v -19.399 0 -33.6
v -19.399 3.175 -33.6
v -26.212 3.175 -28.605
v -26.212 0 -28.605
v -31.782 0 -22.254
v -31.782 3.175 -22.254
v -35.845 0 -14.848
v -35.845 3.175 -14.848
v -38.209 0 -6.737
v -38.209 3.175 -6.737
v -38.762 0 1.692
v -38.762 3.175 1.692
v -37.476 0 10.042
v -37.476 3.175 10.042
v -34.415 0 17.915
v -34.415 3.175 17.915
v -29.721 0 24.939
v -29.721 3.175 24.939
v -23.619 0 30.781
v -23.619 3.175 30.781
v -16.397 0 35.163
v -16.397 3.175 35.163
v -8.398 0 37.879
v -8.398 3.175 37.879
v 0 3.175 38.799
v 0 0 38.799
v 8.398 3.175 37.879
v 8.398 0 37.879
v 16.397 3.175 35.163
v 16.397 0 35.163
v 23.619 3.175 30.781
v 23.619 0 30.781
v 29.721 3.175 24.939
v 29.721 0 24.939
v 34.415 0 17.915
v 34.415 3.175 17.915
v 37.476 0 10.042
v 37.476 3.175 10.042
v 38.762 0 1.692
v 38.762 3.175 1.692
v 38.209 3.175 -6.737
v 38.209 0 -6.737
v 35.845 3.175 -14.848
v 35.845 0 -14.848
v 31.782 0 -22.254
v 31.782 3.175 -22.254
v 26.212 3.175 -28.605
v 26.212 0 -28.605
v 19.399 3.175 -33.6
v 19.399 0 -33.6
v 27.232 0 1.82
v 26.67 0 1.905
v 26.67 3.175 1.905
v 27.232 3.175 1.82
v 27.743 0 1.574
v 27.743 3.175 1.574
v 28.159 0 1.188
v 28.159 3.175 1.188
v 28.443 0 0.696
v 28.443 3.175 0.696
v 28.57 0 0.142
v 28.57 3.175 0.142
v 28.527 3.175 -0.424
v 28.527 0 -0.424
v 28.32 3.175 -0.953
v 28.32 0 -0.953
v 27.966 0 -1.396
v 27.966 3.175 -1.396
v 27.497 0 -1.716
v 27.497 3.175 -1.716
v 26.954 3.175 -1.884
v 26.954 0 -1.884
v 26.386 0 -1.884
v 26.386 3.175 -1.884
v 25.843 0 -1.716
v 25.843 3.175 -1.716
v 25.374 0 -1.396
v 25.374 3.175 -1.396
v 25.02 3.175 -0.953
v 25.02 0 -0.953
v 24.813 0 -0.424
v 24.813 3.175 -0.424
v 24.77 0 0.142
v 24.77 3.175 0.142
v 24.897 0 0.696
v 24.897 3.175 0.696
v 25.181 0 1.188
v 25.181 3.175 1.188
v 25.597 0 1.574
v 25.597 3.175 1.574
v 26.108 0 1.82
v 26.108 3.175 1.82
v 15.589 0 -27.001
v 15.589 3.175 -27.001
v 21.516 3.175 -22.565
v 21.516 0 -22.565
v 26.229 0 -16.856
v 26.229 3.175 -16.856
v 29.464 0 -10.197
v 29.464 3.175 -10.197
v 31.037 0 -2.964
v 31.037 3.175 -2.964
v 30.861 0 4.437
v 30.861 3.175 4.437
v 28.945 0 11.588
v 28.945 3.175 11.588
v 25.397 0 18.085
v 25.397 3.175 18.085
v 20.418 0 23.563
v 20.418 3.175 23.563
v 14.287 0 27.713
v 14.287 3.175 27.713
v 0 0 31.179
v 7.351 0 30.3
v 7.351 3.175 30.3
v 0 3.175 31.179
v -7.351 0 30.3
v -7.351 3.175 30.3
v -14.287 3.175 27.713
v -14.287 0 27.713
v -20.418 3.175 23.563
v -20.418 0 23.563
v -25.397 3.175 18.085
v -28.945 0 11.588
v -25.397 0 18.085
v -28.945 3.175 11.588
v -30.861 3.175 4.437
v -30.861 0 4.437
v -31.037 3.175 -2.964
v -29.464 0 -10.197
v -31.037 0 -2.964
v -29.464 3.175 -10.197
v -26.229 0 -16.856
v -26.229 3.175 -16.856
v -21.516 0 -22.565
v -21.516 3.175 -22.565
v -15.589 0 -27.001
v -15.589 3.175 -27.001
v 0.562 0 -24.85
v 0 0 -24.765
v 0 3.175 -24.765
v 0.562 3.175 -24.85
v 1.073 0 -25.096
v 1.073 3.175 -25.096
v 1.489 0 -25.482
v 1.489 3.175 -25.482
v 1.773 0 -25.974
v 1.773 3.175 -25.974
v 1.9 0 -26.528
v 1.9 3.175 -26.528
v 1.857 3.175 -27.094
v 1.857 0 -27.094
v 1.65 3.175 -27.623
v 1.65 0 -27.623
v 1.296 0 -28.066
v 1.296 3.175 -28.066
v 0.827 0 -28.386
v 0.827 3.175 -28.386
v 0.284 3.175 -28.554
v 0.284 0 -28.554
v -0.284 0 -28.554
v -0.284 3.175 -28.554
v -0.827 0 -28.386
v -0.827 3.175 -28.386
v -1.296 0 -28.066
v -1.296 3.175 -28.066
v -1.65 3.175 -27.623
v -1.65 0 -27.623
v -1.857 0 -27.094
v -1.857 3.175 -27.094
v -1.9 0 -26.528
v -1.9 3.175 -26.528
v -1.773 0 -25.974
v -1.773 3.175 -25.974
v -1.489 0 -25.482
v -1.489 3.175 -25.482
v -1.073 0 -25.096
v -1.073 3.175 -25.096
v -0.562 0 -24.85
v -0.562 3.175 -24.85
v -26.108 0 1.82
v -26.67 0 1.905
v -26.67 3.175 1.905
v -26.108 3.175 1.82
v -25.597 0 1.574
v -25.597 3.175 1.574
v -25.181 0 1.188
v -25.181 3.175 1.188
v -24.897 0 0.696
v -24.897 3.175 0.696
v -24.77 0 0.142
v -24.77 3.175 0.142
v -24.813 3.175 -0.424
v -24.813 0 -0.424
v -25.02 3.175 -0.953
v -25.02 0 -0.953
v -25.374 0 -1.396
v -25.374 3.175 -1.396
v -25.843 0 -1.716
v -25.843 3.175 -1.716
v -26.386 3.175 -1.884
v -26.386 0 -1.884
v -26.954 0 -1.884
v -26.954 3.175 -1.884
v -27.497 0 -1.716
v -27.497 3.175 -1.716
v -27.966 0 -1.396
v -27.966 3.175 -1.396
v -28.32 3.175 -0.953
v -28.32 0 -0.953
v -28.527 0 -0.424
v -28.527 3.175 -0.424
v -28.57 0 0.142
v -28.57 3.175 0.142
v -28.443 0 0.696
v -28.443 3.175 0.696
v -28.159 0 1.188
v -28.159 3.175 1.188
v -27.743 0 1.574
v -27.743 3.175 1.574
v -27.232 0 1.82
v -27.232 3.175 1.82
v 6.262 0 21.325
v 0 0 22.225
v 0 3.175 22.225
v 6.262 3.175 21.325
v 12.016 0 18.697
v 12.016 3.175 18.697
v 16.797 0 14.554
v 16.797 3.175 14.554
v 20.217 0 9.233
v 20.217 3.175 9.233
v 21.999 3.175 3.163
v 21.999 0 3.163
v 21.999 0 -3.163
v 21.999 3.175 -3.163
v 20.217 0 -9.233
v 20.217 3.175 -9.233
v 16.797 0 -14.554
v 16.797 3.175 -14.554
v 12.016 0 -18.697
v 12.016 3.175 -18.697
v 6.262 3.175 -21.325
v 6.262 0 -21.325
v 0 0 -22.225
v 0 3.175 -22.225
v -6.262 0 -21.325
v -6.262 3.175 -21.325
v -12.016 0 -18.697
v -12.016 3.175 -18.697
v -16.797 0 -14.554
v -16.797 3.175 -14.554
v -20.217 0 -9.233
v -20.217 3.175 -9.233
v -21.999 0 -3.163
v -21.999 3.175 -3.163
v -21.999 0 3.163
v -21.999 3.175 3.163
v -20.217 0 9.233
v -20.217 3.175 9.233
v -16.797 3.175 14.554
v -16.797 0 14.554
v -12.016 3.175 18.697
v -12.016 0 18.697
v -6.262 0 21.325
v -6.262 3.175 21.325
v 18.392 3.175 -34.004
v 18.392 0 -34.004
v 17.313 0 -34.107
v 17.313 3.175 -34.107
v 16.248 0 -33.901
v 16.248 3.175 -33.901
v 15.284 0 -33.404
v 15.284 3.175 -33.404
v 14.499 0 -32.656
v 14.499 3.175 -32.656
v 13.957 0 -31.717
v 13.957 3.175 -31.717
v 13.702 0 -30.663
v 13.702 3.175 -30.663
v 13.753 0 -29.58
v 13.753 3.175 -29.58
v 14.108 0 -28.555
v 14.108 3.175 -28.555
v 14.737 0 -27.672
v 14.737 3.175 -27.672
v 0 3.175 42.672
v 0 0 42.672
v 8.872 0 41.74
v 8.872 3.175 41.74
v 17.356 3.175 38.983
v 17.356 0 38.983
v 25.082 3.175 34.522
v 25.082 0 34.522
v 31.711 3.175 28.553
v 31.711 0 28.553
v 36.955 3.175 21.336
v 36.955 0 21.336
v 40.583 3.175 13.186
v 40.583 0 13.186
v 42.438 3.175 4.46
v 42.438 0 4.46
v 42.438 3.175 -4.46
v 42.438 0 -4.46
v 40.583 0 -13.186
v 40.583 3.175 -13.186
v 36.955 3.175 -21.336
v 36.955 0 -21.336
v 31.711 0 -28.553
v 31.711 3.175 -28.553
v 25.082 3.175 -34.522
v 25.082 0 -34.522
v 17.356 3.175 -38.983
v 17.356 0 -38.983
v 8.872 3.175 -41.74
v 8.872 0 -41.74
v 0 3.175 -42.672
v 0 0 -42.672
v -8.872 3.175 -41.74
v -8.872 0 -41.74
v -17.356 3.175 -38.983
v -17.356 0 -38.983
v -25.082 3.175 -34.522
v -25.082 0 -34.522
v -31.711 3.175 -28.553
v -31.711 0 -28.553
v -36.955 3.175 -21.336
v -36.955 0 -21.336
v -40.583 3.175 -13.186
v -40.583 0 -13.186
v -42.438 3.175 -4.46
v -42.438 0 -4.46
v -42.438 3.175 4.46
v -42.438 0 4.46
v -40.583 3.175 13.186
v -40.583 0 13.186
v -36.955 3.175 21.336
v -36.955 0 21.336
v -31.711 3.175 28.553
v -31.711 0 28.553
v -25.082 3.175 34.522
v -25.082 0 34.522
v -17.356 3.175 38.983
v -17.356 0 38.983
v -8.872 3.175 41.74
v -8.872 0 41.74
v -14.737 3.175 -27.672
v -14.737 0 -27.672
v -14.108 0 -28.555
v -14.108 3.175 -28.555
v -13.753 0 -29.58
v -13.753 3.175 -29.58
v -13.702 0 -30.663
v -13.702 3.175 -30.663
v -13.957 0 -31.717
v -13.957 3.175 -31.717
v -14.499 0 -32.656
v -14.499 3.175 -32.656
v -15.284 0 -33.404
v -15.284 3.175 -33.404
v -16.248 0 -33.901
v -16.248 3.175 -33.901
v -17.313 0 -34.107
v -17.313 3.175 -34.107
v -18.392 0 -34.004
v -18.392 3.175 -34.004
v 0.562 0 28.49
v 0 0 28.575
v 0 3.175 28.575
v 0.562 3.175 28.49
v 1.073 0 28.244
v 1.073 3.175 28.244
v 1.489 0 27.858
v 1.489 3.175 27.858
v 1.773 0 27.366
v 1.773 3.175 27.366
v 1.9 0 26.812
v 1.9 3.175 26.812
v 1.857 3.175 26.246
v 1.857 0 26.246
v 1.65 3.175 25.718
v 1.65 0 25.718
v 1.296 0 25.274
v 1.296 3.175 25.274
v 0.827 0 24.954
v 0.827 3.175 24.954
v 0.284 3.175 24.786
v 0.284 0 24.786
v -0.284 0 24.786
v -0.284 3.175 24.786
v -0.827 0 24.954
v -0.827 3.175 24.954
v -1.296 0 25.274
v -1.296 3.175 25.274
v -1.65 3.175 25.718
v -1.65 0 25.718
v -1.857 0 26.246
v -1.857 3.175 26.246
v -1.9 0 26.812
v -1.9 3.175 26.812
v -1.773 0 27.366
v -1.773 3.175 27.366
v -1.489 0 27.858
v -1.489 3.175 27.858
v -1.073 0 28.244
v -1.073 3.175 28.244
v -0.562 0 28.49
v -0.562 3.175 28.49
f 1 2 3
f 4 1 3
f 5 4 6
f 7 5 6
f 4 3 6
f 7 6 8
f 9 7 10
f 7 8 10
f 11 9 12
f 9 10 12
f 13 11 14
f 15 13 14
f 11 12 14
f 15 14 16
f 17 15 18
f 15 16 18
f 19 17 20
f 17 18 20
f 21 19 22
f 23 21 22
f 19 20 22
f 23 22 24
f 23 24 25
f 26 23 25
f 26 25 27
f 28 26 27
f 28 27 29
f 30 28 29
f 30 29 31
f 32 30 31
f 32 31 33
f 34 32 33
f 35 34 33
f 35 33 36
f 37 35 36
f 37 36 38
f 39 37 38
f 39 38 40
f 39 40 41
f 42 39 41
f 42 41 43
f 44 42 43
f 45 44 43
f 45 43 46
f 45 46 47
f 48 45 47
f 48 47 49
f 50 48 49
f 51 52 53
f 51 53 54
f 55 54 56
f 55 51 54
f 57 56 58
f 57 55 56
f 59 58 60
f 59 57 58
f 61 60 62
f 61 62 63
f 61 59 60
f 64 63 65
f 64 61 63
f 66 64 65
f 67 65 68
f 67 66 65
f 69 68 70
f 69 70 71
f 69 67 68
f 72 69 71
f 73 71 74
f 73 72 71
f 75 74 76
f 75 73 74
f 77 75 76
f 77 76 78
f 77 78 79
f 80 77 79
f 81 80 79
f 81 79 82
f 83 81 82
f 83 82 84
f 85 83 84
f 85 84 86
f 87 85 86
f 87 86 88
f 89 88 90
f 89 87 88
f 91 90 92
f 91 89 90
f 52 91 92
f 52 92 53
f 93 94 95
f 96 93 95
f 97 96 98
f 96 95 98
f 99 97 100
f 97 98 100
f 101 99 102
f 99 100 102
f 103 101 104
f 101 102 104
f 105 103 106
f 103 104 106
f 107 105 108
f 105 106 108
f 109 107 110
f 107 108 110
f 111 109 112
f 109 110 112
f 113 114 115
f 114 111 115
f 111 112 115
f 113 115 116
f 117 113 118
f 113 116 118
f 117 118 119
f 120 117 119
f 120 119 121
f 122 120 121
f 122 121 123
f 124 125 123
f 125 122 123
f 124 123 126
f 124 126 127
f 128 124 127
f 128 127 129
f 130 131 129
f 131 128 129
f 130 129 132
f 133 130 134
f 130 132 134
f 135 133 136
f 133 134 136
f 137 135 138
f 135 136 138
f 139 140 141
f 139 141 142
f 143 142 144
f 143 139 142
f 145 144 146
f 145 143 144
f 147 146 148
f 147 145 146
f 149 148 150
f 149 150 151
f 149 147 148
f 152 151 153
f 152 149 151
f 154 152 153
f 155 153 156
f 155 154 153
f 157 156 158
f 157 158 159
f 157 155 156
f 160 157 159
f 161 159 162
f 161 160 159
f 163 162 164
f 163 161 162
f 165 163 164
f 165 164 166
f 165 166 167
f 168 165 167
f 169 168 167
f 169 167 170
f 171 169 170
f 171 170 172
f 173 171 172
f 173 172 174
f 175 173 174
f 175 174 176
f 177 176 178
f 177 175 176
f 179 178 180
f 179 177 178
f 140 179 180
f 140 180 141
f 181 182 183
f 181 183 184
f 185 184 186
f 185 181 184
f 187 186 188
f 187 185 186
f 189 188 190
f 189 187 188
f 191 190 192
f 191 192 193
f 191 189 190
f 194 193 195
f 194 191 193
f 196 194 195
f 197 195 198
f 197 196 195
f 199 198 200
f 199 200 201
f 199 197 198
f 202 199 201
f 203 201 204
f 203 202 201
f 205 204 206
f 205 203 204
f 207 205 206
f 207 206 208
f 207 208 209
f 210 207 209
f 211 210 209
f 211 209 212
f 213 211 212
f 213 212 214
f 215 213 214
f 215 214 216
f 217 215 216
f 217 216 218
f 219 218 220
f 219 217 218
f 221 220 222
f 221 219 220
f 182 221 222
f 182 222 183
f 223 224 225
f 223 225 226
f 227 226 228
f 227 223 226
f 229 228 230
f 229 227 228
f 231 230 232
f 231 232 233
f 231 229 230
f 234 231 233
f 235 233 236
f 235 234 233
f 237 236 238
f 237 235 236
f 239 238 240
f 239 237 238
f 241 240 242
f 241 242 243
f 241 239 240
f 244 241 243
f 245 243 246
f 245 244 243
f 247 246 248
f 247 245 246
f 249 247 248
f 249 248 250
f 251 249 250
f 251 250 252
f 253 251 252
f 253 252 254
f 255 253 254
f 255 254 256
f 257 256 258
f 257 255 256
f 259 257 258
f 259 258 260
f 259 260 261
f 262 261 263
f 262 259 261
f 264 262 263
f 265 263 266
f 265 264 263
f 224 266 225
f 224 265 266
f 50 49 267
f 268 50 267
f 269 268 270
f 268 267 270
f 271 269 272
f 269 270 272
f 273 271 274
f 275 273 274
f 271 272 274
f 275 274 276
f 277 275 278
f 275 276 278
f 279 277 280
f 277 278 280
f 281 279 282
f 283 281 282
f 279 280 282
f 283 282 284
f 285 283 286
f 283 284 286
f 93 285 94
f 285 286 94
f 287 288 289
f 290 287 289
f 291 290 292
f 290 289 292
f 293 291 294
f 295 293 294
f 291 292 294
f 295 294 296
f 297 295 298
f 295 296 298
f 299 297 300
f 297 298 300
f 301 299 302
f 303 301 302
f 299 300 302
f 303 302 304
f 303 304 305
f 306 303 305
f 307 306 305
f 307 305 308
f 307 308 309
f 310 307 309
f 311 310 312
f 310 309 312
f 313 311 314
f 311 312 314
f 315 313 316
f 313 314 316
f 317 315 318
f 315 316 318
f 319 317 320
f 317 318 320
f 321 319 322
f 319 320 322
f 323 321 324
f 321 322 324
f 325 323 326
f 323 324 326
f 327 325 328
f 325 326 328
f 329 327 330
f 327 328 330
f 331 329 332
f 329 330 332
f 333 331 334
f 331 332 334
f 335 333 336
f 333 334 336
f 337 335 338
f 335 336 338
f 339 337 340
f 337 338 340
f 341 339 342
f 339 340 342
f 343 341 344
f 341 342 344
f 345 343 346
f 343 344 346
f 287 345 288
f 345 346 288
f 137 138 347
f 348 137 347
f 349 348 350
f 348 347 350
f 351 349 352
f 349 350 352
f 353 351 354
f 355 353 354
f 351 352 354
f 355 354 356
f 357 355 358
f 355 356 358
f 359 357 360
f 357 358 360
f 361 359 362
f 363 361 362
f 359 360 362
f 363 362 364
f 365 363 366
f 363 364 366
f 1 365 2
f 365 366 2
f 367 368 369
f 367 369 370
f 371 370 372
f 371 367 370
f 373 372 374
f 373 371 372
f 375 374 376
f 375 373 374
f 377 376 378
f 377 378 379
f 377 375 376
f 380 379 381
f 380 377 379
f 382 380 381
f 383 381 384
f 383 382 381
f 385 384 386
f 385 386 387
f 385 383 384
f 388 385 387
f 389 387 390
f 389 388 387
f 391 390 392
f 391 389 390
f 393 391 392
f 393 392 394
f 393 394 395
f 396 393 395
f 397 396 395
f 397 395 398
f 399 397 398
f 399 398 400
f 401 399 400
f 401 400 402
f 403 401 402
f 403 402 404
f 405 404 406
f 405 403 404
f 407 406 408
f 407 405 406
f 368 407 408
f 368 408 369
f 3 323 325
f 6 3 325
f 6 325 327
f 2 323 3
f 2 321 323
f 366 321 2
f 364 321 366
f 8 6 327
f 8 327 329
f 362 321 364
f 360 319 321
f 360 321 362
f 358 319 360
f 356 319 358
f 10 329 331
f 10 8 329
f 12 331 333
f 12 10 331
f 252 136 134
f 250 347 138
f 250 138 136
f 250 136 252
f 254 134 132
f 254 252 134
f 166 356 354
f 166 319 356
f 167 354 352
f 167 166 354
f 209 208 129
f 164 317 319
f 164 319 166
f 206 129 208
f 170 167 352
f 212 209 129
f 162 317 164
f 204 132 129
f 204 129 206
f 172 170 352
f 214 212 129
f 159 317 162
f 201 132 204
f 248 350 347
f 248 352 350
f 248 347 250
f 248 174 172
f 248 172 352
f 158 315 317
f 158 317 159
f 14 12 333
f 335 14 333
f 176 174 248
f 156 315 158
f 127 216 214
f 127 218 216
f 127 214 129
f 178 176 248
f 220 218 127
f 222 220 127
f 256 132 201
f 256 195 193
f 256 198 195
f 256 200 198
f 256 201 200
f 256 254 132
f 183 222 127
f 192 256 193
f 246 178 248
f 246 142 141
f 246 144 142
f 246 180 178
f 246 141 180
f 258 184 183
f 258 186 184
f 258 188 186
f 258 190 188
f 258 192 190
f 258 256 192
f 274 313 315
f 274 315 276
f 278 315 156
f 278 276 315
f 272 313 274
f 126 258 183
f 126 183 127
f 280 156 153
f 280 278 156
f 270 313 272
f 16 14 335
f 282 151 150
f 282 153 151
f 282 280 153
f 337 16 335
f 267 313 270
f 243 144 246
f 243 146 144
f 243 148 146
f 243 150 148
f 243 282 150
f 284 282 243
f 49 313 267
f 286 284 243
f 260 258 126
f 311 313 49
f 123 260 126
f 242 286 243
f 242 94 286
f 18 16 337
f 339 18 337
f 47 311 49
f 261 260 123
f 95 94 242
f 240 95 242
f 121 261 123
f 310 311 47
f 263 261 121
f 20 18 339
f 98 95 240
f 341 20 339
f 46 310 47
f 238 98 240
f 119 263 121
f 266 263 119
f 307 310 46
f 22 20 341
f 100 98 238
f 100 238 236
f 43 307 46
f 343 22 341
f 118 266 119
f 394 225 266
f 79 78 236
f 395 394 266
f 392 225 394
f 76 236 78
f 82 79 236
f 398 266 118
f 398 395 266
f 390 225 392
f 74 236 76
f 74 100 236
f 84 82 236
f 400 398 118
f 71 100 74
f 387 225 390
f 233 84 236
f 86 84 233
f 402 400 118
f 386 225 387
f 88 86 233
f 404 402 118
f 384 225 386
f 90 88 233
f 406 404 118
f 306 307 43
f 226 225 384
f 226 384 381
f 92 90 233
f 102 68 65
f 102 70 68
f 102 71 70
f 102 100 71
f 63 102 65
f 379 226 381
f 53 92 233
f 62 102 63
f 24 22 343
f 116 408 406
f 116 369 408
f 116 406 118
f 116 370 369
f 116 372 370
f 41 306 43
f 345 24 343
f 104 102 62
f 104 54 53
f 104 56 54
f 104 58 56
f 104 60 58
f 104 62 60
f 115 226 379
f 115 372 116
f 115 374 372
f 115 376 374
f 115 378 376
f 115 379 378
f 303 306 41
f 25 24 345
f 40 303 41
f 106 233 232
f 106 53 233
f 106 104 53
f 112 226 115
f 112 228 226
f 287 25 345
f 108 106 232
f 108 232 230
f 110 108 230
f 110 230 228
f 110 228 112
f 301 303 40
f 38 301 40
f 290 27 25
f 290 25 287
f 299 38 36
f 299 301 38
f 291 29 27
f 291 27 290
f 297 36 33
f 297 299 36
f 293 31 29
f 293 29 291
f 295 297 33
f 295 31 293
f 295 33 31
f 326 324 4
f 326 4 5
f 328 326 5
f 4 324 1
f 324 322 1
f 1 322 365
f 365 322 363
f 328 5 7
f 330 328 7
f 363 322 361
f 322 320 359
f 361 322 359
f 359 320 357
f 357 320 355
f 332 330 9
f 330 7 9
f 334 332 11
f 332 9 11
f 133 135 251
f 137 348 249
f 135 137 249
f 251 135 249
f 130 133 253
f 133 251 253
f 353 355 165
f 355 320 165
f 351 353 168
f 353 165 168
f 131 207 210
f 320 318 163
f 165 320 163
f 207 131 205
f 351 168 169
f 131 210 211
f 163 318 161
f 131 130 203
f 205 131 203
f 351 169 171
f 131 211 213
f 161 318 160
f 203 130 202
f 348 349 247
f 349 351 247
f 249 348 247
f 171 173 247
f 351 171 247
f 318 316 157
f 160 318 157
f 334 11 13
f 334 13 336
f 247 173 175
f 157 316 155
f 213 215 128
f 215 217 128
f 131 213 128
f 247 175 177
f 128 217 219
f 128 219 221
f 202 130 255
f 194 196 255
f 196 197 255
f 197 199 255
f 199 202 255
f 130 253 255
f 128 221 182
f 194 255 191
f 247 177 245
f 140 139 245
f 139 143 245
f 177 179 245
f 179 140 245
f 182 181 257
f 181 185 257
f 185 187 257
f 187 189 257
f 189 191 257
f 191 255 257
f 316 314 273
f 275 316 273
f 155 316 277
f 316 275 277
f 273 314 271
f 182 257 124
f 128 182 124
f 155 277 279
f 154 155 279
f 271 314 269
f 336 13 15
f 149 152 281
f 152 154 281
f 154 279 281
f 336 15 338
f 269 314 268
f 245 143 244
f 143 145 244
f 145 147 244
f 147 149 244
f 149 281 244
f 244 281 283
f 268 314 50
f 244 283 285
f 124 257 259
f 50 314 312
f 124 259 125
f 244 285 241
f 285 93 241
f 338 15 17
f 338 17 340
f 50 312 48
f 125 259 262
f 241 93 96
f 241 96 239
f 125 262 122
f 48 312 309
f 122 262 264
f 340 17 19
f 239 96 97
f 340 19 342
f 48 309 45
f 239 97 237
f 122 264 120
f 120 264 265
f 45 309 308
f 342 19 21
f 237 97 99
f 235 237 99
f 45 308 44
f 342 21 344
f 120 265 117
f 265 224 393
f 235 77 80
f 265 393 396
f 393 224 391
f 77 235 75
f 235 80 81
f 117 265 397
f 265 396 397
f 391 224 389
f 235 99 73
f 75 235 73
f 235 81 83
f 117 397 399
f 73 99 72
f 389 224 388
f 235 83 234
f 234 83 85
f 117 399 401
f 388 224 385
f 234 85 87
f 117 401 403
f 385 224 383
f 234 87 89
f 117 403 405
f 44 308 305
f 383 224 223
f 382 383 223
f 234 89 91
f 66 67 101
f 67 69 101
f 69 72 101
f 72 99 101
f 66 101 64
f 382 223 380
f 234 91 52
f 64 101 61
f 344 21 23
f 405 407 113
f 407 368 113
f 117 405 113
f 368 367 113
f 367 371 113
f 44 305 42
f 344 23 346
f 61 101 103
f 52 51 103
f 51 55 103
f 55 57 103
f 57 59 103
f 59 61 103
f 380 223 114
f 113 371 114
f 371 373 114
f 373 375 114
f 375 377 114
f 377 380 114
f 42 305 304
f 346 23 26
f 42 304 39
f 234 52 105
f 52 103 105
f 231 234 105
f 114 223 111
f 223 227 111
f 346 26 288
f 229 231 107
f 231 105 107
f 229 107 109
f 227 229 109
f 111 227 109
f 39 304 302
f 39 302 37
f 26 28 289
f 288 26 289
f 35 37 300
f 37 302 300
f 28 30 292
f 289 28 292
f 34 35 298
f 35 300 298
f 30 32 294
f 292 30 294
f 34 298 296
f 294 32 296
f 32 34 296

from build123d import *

# Parameters (mm, degrees)
SKETCH1_R           = 42.672
SKETCH1_R_2         = 22.225
SKETCH1_R_3         = 1.905
BOSS_EXTRUDE1_DEPTH = 3.175
CUT_EXTRUDE1_DEPTH  = 61.430785143


with BuildPart() as part:
    # Sketch1 → Boss-Extrude1 (new body)
    with BuildSketch(Plane(origin=(0, 0, 0), x_dir=(1, 0, 0), z_dir=(0, 1, 0))):
        with Locations(Location((0, 0, 0), (0, 0, 270))):
            Circle(SKETCH1_R)
        with Locations(Location((0, 0, 0), (0, 0, 270))):
            Circle(SKETCH1_R_2, mode=Mode.SUBTRACT)
        with Locations(Location((0, 26.67, 0), (0, 0, 270))):
            Circle(SKETCH1_R_3, mode=Mode.SUBTRACT)
        with Locations(Location((26.67, 0, 0), (0, 0, 270))):
            Circle(SKETCH1_R_3, mode=Mode.SUBTRACT)
        with Locations(Location((0, -26.67, 0), (0, 0, 270))):
            Circle(SKETCH1_R_3, mode=Mode.SUBTRACT)
        with Locations(Location((-26.67, 0, 0), (0, 0, 270))):
            Circle(SKETCH1_R_3, mode=Mode.SUBTRACT)
    extrude(amount=BOSS_EXTRUDE1_DEPTH)

    # Sketch2 → Cut-Extrude1 (cut, through all)
    with BuildSketch(Plane(origin=(0, 3.175, 0), x_dir=(1, 0, 0), z_dir=(0, 1, 0))):
        with BuildLine():
            ThreePointArc((-15.58925, 27.001373052), (-14.194693212, 32.20592984), (-19.39925, 33.600486629))
            ThreePointArc((-19.39925, 33.600486629), (0, -38.7985), (19.39925, 33.600486629))
            ThreePointArc((19.39925, 33.600486629), (14.194693212, 32.20592984), (15.58925, 27.001373052))
            ThreePointArc((15.58925, 27.001373052), (0, -31.1785), (-15.58925, 27.001373052))
        make_face()
    extrude(amount=-CUT_EXTRUDE1_DEPTH, mode=Mode.SUBTRACT)


solid = part.part
